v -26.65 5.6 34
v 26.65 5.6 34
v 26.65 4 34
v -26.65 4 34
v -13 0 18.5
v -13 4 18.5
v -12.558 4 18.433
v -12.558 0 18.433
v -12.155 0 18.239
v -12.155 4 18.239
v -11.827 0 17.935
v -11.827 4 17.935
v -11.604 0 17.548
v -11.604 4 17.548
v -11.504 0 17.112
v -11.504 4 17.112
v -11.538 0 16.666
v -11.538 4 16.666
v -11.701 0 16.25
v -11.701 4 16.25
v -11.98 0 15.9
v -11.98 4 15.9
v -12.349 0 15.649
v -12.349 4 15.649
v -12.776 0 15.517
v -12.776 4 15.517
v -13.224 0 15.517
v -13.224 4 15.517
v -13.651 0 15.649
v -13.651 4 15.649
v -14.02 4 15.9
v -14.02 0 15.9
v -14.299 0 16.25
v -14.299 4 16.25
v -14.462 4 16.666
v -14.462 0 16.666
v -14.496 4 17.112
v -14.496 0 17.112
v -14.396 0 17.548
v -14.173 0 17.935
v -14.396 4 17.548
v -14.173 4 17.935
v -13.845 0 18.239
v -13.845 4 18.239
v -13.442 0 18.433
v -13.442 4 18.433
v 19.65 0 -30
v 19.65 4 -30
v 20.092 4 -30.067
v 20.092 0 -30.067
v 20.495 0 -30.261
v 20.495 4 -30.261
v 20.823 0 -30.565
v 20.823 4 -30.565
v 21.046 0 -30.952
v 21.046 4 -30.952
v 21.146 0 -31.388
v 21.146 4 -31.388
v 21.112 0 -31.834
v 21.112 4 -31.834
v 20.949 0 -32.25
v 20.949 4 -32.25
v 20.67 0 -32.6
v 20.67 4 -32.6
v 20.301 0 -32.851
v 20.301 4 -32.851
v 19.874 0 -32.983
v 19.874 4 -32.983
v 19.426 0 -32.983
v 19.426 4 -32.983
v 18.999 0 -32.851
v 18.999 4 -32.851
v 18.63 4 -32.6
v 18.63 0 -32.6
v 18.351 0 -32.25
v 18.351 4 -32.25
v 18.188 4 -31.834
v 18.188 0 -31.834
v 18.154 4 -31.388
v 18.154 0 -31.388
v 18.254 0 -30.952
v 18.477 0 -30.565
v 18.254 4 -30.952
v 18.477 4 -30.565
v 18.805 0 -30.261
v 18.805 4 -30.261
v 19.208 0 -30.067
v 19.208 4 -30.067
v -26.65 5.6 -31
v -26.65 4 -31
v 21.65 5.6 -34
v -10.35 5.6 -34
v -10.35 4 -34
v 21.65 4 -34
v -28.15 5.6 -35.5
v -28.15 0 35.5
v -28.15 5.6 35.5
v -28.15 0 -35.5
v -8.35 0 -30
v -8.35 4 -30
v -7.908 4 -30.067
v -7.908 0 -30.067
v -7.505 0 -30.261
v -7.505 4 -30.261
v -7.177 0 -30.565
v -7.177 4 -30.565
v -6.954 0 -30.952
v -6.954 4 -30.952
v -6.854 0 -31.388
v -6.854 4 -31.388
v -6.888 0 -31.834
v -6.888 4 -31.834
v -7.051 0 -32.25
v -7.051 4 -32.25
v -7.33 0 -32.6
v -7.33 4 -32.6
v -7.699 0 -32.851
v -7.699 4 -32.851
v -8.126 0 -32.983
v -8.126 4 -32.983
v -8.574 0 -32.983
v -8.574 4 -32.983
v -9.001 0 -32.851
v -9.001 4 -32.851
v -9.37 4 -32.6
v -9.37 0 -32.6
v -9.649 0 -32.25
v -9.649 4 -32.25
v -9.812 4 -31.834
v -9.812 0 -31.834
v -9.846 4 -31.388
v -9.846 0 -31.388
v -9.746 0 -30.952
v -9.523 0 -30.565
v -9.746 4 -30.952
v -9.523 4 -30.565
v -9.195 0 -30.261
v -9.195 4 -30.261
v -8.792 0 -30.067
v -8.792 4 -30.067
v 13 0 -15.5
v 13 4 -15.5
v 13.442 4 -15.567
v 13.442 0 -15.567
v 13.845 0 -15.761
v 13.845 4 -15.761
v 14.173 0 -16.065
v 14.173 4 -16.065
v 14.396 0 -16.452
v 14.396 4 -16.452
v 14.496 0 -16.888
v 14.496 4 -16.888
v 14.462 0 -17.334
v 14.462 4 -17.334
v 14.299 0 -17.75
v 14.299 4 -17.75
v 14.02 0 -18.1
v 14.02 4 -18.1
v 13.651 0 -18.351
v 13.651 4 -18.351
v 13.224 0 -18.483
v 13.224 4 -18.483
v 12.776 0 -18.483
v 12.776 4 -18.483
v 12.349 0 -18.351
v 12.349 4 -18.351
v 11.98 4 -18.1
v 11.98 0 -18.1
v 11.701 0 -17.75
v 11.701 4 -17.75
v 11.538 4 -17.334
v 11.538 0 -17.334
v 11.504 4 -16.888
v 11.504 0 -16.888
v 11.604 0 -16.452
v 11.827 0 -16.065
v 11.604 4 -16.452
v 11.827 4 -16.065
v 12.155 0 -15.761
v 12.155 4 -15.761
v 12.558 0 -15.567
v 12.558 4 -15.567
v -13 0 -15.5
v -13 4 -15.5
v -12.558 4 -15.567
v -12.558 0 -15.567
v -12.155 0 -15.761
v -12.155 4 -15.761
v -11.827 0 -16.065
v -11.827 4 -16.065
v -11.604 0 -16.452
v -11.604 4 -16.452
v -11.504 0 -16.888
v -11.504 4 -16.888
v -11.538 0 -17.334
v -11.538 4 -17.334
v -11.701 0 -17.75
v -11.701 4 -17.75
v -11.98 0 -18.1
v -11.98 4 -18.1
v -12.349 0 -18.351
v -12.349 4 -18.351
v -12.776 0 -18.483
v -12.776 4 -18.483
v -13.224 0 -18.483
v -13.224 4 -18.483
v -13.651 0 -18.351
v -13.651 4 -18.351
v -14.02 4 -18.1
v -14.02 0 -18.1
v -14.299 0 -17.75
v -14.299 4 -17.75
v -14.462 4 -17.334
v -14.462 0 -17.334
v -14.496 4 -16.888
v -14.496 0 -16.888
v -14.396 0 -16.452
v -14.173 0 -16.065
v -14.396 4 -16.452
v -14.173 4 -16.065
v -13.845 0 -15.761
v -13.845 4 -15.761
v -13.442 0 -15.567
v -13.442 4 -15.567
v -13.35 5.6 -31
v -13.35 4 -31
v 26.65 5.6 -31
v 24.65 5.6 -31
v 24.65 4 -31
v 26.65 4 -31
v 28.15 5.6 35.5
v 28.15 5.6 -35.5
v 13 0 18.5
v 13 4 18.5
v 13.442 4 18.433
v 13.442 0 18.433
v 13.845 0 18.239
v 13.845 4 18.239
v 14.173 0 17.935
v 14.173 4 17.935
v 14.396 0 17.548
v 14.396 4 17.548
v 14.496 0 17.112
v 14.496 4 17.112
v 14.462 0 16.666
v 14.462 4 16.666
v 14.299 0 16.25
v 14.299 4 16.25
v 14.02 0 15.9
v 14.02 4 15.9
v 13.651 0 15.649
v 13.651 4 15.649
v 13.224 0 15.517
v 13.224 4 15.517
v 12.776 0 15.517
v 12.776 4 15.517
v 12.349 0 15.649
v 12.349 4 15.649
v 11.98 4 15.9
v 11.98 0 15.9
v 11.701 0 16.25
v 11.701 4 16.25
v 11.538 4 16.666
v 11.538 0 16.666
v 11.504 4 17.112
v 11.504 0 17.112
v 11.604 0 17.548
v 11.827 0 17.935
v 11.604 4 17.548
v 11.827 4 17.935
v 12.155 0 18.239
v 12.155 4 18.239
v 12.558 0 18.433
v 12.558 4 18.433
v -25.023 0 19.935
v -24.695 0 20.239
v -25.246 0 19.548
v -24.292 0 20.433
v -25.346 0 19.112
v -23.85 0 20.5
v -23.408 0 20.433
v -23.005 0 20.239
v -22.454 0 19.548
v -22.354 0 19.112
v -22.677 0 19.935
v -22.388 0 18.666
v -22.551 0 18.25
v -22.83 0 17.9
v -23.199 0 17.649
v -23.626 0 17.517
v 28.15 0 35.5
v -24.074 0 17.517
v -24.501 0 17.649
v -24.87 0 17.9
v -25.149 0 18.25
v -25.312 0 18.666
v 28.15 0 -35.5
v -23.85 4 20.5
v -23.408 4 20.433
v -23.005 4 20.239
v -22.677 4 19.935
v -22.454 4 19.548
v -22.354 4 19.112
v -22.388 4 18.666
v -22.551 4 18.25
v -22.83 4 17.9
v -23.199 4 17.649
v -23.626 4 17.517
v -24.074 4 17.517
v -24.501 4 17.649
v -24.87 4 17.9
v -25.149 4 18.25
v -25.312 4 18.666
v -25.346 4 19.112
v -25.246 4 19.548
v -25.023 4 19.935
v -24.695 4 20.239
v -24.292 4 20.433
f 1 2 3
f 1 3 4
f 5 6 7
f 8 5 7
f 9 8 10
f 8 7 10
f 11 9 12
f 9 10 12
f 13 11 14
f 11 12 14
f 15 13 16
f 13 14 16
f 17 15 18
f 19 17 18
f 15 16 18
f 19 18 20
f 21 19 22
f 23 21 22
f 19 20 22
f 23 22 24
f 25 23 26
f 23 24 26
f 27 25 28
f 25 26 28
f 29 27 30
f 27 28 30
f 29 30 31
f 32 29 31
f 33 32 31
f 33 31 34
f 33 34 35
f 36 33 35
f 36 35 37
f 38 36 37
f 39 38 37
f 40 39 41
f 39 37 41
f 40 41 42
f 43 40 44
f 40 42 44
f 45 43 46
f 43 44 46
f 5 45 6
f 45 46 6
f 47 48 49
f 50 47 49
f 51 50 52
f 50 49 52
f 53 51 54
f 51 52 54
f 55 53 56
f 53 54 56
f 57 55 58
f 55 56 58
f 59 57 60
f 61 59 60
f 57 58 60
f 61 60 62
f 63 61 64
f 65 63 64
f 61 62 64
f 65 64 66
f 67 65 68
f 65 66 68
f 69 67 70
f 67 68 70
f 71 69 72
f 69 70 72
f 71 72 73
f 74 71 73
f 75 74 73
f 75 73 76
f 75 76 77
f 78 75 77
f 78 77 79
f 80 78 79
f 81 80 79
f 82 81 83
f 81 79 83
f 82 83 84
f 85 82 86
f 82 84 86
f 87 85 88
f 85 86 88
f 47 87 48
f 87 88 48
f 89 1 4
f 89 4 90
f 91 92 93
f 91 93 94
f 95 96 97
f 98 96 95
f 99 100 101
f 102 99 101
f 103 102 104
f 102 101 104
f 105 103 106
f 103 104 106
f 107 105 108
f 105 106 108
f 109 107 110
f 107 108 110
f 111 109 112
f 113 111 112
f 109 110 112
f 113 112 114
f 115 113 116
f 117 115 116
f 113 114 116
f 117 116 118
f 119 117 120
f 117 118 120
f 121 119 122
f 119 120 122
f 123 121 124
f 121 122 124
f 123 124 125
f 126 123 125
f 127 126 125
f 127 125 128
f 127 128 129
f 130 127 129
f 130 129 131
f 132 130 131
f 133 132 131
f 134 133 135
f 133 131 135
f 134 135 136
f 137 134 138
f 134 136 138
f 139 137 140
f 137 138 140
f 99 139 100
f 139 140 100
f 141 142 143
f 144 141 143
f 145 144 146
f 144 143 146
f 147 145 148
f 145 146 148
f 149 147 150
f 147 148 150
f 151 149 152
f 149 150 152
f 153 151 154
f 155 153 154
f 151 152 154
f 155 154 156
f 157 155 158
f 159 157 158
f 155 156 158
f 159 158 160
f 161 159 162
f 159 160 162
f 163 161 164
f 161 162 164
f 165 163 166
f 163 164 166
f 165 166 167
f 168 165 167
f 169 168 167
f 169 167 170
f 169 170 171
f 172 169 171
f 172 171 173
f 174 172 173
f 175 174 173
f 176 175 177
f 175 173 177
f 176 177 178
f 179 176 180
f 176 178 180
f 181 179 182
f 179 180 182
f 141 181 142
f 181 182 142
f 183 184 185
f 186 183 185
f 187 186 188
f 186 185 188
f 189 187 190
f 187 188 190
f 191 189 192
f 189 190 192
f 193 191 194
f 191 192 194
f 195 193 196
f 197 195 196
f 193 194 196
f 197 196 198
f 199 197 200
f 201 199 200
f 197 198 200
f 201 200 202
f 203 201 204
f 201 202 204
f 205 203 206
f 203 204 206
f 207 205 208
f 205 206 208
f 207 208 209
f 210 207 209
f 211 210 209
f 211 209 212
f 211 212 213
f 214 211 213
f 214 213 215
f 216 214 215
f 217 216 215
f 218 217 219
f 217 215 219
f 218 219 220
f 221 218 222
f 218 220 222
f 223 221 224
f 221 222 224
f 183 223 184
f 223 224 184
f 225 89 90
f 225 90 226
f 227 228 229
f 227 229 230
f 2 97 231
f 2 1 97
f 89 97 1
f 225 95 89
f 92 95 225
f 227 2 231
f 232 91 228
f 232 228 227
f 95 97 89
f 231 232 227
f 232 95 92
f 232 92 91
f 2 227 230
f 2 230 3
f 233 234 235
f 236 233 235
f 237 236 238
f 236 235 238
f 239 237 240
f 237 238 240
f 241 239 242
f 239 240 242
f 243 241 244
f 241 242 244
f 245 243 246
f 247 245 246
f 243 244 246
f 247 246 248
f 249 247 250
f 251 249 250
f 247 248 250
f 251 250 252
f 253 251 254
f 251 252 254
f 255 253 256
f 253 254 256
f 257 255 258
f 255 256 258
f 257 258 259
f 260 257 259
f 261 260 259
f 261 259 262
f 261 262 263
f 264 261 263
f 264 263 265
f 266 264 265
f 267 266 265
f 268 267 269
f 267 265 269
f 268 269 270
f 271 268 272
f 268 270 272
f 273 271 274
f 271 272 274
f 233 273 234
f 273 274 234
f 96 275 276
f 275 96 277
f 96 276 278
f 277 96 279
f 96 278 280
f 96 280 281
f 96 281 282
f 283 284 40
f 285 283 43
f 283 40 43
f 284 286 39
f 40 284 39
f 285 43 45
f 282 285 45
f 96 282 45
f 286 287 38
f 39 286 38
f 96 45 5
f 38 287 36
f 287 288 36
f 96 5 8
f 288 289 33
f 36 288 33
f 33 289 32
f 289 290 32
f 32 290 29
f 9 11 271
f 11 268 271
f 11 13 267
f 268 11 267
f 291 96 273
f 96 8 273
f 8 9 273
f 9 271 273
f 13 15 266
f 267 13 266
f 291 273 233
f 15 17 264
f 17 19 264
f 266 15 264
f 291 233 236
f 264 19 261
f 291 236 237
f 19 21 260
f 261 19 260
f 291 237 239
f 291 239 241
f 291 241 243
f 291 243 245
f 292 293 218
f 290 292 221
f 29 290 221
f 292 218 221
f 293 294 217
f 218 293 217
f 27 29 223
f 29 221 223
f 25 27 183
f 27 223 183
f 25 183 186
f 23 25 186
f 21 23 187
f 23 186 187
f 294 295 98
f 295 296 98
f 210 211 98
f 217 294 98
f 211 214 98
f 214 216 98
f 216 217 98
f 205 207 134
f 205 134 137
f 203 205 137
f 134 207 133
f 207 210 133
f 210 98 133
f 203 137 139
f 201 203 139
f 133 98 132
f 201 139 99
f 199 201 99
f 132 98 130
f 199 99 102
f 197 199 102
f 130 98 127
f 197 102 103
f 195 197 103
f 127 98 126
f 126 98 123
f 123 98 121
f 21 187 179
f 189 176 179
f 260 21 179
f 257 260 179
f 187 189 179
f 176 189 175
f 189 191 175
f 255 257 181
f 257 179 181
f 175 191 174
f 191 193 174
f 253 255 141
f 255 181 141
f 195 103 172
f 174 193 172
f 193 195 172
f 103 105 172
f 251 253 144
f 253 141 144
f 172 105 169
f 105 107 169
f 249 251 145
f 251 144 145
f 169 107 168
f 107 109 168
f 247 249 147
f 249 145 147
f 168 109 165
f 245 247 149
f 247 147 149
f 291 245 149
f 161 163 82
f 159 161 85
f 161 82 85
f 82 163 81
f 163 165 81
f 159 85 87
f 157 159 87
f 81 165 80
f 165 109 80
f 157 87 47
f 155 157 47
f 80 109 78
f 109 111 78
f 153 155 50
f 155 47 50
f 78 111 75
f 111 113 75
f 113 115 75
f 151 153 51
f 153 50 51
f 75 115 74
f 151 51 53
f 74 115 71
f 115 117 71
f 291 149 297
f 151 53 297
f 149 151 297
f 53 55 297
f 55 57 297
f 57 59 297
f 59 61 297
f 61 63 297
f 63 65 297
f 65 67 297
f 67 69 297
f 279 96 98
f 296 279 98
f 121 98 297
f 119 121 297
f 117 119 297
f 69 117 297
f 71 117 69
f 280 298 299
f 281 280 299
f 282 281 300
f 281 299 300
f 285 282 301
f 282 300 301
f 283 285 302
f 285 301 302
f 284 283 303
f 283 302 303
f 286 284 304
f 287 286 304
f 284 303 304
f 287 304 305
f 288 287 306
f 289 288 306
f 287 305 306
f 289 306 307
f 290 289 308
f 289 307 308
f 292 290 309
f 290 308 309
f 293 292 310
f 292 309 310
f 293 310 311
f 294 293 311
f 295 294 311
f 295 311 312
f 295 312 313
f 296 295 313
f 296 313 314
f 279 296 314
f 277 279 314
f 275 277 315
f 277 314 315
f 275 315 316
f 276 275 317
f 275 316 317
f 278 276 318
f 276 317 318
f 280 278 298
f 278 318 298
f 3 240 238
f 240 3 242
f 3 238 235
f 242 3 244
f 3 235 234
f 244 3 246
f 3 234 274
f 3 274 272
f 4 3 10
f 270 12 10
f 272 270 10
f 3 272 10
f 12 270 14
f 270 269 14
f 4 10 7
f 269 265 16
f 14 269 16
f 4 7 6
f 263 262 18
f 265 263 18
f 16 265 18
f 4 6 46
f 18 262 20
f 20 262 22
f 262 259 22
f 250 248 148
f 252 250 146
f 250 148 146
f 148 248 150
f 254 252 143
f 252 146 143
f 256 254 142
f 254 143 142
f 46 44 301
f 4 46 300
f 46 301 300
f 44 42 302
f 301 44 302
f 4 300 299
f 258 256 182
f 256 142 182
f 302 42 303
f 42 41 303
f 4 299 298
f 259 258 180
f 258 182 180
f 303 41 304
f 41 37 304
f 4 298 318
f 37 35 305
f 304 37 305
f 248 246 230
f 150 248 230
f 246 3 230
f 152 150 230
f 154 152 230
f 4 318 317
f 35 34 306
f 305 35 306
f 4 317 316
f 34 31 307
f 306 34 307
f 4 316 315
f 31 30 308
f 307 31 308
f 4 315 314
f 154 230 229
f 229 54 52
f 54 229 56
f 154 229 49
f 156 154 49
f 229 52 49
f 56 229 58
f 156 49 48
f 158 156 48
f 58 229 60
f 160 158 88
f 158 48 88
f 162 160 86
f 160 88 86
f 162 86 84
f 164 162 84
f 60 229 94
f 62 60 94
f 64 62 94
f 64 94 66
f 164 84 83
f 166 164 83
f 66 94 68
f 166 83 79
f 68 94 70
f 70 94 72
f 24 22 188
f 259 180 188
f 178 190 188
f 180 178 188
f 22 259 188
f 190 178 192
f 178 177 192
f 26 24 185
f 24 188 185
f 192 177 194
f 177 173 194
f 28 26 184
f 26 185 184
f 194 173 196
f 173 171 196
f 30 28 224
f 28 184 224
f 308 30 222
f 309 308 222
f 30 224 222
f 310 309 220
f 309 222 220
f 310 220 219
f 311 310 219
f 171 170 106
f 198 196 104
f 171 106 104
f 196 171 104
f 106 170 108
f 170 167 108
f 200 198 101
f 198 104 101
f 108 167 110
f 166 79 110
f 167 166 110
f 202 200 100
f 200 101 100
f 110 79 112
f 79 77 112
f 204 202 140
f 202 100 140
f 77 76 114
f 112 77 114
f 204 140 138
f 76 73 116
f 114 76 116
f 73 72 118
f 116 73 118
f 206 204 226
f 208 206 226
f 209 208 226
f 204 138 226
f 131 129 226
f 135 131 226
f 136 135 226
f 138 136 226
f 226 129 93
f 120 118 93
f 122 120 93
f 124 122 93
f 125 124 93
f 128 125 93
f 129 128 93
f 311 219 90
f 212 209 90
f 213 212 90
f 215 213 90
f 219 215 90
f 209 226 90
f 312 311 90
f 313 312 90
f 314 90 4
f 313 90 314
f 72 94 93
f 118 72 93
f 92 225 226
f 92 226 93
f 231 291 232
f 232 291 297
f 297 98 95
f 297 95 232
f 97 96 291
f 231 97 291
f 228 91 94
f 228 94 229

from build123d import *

# Parameters (mm, degrees)
SKETCH1_W           = 56.3
SKETCH1_H           = 71
BOSS_EXTRUDE1_DEPTH = 5.6
CUT_EXTRUDE1_DEPTH  = 1.6
SKETCH3_R           = 1.5
CUT_EXTRUDE2_DEPTH  = 4
SKETCH5_R           = 1.5
CUT_EXTRUDE3_DEPTH  = 4


with BuildPart() as part:
    # Sketch1 → Boss-Extrude1 (new body)
    with BuildSketch(Plane(origin=(0, 0, 0), x_dir=(1, 0, 0), z_dir=(0, 1, 0))):
        Rectangle(SKETCH1_W, SKETCH1_H)
    extrude(amount=BOSS_EXTRUDE1_DEPTH)

    # Sketch2 → Cut-Extrude1 (cut)
    with BuildSketch(Plane(origin=(0, 5.6, 0), x_dir=(1, 0, 0), z_dir=(0, 1, 0))):
        Polygon((26.65, -34), (-26.65, -34), (-26.65, 31), (-13.35, 31), (-10.35, 34), (21.65, 34), (24.65, 31), (26.65, 31), align=None)
    extrude(amount=-CUT_EXTRUDE1_DEPTH, mode=Mode.SUBTRACT)

    # Sketch3 → Cut-Extrude2 (cut)
    with BuildSketch(Plane(origin=(0, 4, 0), x_dir=(1, 0, 0), z_dir=(0, 1, 0))):
        with Locations(Location((-8.35, 31.5, 0), (0, 0, 270))):
            Circle(SKETCH3_R)
        with Locations(Location((19.65, 31.5, 0), (0, 0, 270))):
            Circle(SKETCH3_R)
        with Locations(Location((-23.85, -19, 0), (0, 0, 270))):
            Circle(SKETCH3_R)
    extrude(amount=-CUT_EXTRUDE2_DEPTH, mode=Mode.SUBTRACT)

    # Sketch5 → Cut-Extrude3 (cut)
    with BuildSketch(Plane(origin=(0, 4, 0), x_dir=(1, 0, 0), z_dir=(0, 1, 0))):
        with Locations(Location((-13, 17, 0), (0, 0, 270))):
            Circle(SKETCH5_R)
        with Locations(Location((13, -17, 0), (0, 0, 270))):
            Circle(SKETCH5_R)
        with Locations(Location((13, 17, 0), (0, 0, 270))):
            Circle(SKETCH5_R)
        with Locations(Location((-13, -17, 0), (0, 0, 270))):
            Circle(SKETCH5_R)
    extrude(amount=-CUT_EXTRUDE3_DEPTH, mode=Mode.SUBTRACT)


solid = part.part
